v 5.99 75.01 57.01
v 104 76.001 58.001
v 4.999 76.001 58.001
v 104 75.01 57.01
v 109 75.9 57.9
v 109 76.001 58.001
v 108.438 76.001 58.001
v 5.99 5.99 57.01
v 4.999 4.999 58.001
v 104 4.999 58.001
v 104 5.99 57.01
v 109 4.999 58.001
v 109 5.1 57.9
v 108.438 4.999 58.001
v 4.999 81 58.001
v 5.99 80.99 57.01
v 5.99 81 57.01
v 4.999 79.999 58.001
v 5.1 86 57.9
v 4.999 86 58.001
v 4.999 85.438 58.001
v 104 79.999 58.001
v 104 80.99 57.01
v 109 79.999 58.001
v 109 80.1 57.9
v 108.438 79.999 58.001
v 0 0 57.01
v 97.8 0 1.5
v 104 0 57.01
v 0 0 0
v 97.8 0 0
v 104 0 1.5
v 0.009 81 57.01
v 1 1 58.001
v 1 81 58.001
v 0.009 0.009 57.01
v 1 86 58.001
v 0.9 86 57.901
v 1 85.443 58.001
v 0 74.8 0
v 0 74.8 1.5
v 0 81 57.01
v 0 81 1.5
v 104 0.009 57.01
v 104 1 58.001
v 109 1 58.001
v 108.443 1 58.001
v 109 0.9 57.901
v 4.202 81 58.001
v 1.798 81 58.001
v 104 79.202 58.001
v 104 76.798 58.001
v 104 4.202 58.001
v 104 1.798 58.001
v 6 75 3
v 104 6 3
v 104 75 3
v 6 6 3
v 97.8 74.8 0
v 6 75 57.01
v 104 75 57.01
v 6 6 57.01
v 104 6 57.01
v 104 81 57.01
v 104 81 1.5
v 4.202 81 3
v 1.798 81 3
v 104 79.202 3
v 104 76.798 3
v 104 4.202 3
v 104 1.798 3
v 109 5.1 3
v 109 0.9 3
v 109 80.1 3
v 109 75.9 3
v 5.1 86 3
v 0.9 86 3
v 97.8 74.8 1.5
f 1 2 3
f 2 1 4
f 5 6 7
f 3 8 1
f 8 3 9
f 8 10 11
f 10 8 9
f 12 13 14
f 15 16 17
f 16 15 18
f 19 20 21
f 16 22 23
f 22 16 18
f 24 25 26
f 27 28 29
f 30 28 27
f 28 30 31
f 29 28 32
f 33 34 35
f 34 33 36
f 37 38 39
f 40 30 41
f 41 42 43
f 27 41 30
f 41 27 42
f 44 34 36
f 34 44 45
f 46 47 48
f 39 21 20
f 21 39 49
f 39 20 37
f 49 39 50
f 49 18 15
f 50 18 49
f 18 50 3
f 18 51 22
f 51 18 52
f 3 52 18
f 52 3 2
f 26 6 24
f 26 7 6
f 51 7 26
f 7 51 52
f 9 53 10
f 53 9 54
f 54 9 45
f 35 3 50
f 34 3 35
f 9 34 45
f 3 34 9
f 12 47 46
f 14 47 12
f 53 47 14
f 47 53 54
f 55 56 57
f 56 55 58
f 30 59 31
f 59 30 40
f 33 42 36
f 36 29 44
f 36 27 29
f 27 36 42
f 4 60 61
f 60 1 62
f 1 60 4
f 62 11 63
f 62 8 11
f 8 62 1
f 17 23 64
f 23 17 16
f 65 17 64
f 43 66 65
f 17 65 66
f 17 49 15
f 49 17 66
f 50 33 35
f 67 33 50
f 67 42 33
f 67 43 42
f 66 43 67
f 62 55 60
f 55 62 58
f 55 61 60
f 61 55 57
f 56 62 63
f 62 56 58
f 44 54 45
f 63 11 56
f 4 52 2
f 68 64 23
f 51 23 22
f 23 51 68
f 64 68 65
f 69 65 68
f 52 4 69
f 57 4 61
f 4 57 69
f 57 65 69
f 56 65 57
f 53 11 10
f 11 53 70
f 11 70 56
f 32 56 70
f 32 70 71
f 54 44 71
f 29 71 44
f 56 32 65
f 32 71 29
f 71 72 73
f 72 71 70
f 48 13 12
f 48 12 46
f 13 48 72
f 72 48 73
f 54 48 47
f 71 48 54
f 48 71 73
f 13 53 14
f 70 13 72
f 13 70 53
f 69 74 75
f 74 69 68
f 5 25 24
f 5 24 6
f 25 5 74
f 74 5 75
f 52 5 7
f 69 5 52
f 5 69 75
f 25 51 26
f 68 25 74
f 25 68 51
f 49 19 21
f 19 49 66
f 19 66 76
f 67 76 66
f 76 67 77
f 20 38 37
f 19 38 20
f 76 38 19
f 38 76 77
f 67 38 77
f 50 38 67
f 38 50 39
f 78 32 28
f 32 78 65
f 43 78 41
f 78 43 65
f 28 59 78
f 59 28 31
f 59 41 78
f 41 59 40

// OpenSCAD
// ============================================================================
// cutlery_box.scad
// Graduated 3-chamber disposable-cutlery box (Option 3) — CUT-FROM-SOLID port
// of build_box.py, for a 120 x 120 x 120 mm printer (AOSEED).
//
// WHY THIS PORT EXISTS (the whole point):
//   The hand-mesh generator (build_box.py) could not keep the 1 mm rim chamfer
//   continuous across the female dovetail joints, because where a slot's flared
//   corner crosses the sloped chamfer it needs a true boolean intersection.
//   OpenSCAD HAS that boolean kernel, so here we do exactly the "cut-from-solid"
//   thing:
//      1. Build the ENTIRE box as ONE solid, WITH the chamfer already on it.
//      2. difference() out vertical dovetail prisms ( /_\ cross-section ),
//         running from just above the base plate up THROUGH the rim, to both
//         (a) form the sliding-dovetail joints, and
//         (b) split the box into 6 bed-sized pieces.
//   Because the cut is a real boolean through the already-chamfered solid, the
//   sloped chamfer<->slot edge is produced for free => the rim chamfer stays
//   CONTINUOUS across every joint, with none of the sliver hacks.
//
// ----------------------------------------------------------------------------
// HOW TO USE
//   In the app:  set `part` below (or use the Customizer dropdown), F5 to
//                preview, F6 to render, then File > Export > STL.
//   One piece (CLI):
//      openscad -o body_knife_A.stl -D 'part="knife_A"' cutlery_box.scad
//   ALL SIX (bash, run from this folder):
//      for p in knife_A knife_B fork_A fork_B spoon_A spoon_B; do \
//        openscad -o "body_$p.stl" -D "part=\"$p\"" cutlery_box.scad ; done
//   PNG preview of one piece:
//      openscad -o knife_B.png --imgsize=1400,1000 --autocenter --viewall \
//        -D 'part="knife_B"' cutlery_box.scad
//
//   Pieces are modelled in ASSEMBLED coordinates (floor-down, z=0 is the bed),
//   so importing all six STLs together shows the assembled box directly; your
//   slicer will auto-drop each one onto the plate for printing.
//
// BED SANITY: every piece is <= 120 mm in X, Y, Z.
//   Z = 58 mm. Widest piece = spoon at 117 mm (Y). A-halves reach 109 mm (X,
//   including the protruding dovetail key). All under 120.
//
// !! I could NOT run OpenSCAD to verify this file (no binary in my sandbox) !!
//   - The rim chamfer is a SMOOTH, true-45 bevel built from hull() frustums of
//     convex rectangles. Works in every OpenSCAD since ~2015 (incl. Homebrew
//     2021.01). No stepped staircase -- and, crucially, it makes box() a clean
//     well-formed solid so the per-part booleans resolve reliably (the old
//     14-slice staircase was fragile and CGAL was dropping the walls of the
//     interior parts, leaving only the key prisms => "floating boxes").
//   - roof() is still available behind USE_ROOF=true for those who have it
//     (2021.01+ snapshots); for THIS rectangular design it is identical, so it
//     is NOT required.
//   - After F6, check the console for "WARNING"/"not a valid 2-manifold".
//     If a tenon ever looks detached, bump EPS to 0.05.
// ============================================================================


/* [Part to render / export] */
part = "knife_A"; // [knife_A, knife_B, fork_A, fork_B, spoon_A, spoon_B, assembly]

/* [Chamfer method] */
// false = smooth hull() frustum bevel (default, any OpenSCAD); true = roof() (2021.01+)
USE_ROOF = false;

/* [Heights (mm)] */
BASE   = 3.0;     // floor / base-plate thickness
COMP_H = 55.0;    // interior wall height above the floor (cutlery stack depth)

/* [Walls (mm)] */
HOST_T   = 6.0;     // thickness of every wall (thick enough to host a dovetail)
HALF_LEN = 104.0;   // printed length of each half (A = near, B = far); <120 incl. key

/* [Chamber bays (mm)] */
N_COL     = 3;       // columns of cutlery per chamber
KNIFE_COL = 23.0;    // -> knife bay 69  (3 x 19 mm knives + play)
FORK_COL  = 33.0;    // -> fork  bay 99  (3 x 29 mm forks  + play)
SPOON_COL = 37.0;    // -> spoon bay 111 (3 x 34 mm spoons + play, trimmed <120)

/* [Dovetail joint (mm)] */
DT_DEPTH = 5.0;   // tail protrusion past the seam (male key depth)
DT_NECK  = 1.2;   // half-width at the seam face (narrow)
DT_FLARE = 2.1;   // half-width at the tip (wide -> locks)
DT_CLR   = 0.4;   // FLANK/seam slide clearance added to the female socket (do not change for fit)
DT_DEPTH_RELIEF = 0.3; // extra depth on the socket BACK only, so the tail tip never bottoms out

/* [Rim chamfer (mm)] */
CHAMFER = 1.0;    // 45-deg comfort break broken along the top wall edges

/* [Base half-lap / anti-warp (mm)] */
// Neighbouring base plates overlap as a HORIZONTAL half-lap (shiplap) at mid-base
// height, so corners stay coplanar (no lift/protrusion). Horizontal lap faces do
// NOT bind the vertical-drop assembly. Shingle direction: A->B and knife->fork->spoon.
LAP_LEN = 6;        // overlap past the A/B seam and the knife/fork seam
LAP_LEN_FS = 2;     // overlap past the fork/SPOON seam -- SMALLER: spoon is the
                    // tightest piece (117mm of the 120mm bed); a 6mm lap there
                    // would push spoon to 123mm. 2mm keeps spoon at 119mm.
LAP_Z   = BASE/2;   // 1.5 -- horizontal split height of the lap (bottom vs top half)
LAP_CLR = 0.2;      // in-plane clearance so the shelf isn't a press fit


/* [Hidden] */
EPS      = 0.01;          // tiny overlap so abutting solids fuse cleanly in CGAL
// Upper-chamber pieces (fork, spoon) were cut by a cell plane laid EXACTLY on the
// divider wall's far face (the lower chamber owns that wall). intersection() along a
// plane coincident with an existing box face makes CGAL leave a ZERO-THICKNESS copy
// of the wall face -> edge-manifold + "watertight" but degenerate (OpenSCAD shows it
// as a blue back-face; Tinkercad thickens it into a phantom block). SEAM_EPS nudges
// those cut planes a hair INTO the open bay so they no longer coincide with any box
// face -> no flap. 0.02 mm is physically nothing but is well clear of CGAL's tolerance.
SEAM_EPS = 0.02;
CUT_OVER = 1.0;           // how far dovetail cutters overshoot the rim (clean cut)

BODY_H    = BASE + COMP_H;     // 58  total height
END_WALL  = HOST_T;            // end walls are dovetail hosts too -> equally thick
TOTAL_LEN = 2 * HALF_LEN;      // 208 assembled length (end wall .. end wall)

// bay widths
KNIFE_BAY = N_COL * KNIFE_COL; // 69
FORK_BAY  = N_COL * FORK_COL;  // 99
SPOON_BAY = N_COL * SPOON_COL; // 111

// ---- Y layout (width direction): wall | bay | divider | bay | divider | bay | wall
KNIFE_Y0 = 0;
KNIFE_Y1 = HOST_T + KNIFE_BAY + HOST_T;        // 0..81   (outer wall + bay + divider)
FORK_Y0  = KNIFE_Y1;                           // 81
FORK_Y1  = FORK_Y0 + FORK_BAY + HOST_T;        // 81..186 (bay + divider)
SPOON_Y0 = FORK_Y1;                            // 186
SPOON_Y1 = SPOON_Y0 + SPOON_BAY + HOST_T;      // 186..303(bay + outer wall)
EXT_W    = SPOON_Y1;                           // 303 total width

// lengthwise wall Y-bands [y0,y1] (host the A/B dovetails) + their centers
OUTER_L  = [0, HOST_T];                                       // [0,6]    c=3
DIV_KF   = [HOST_T + KNIFE_BAY, HOST_T + KNIFE_BAY + HOST_T]; // [75,81]  c=78
DIV_FS   = [FORK_Y0 + FORK_BAY, FORK_Y0 + FORK_BAY + HOST_T]; // [180,186]c=183
OUTER_R  = [SPOON_Y1 - HOST_T, SPOON_Y1];                     // [297,303]c=300

// the three OPEN bays are rectangular holes in the wall footprint:
//   footprint = outer rectangle MINUS these bays  (== the 6 walls; verified).
// The smooth chamfer is built from exactly this decomposition.
BAY_X0 = END_WALL;              // 6
BAY_X1 = TOTAL_LEN - END_WALL;  // 202
BAYS = [
    [BAY_X0, BAY_X1, HOST_T,   HOST_T + KNIFE_BAY],   // knife bay [6,202] x [6,75]
    [BAY_X0, BAY_X1, FORK_Y0,  FORK_Y0 + FORK_BAY],   // fork  bay [6,202] x [81,180]
    [BAY_X0, BAY_X1, SPOON_Y0, SPOON_Y0 + SPOON_BAY], // spoon bay [6,202] x [186,297]
];

YC_OUTL  = OUTER_L[0] + HOST_T/2;   // 3   outer-left wall center
YC_DIVKF = DIV_KF[0]  + HOST_T/2;   // 78  knife/fork divider center
YC_DIVFS = DIV_FS[0]  + HOST_T/2;   // 183 fork/spoon divider center
YC_OUTR  = OUTER_R[0] + HOST_T/2;   // 300 outer-right wall center

// seams
AB_SEAM = HALF_LEN;               // 104  A/B length seam (x)
SEAM_KF = FORK_Y0;                // 81   knife/fork width seam (y)
SEAM_FS = SPOON_Y0;              // 186  fork/spoon width seam (y)
ENDC_A  = END_WALL/2;             // 3    A end-wall center (x) -> chamber dovetails
ENDC_B  = TOTAL_LEN - END_WALL/2; // 205  B end-wall center (x)


// ============================================================================
// 2D wall footprint (cross-section of all walls, constant in z for the straight
// part). Union of: 2 full-width end walls + 4 lengthwise walls between them.
// ============================================================================
module wall_footprint_2d() {
    // footprint = outer rectangle minus the 3 open bays  (== the 6 walls)
    difference() {
        square([TOTAL_LEN, EXT_W]);
        for (b = BAYS) translate([b[0], b[2]]) square([b[1] - b[0], b[3] - b[2]]);
    }
}

// ============================================================================
// The full chamfered box solid = base plate + walls with a continuous 1 mm
// top-rim chamfer. Built ONCE; every piece is carved out of this.
// ============================================================================
module chamfer_cap() {
    // SMOOTH 45 rim chamfer over z[BODY_H-CHAMFER, BODY_H], in absolute coords.
    zm = BODY_H - CHAMFER;
    if (USE_ROOF) {
        // exact straight-skeleton roof, capped at CHAMFER height (needs roof()).
        intersection() {
            translate([0,0,zm]) roof() wall_footprint_2d();
            translate([0,0,zm]) linear_extrude(CHAMFER + EPS) wall_footprint_2d();
        }
    } else {
        // DEFAULT: true 45 bevel as hull() frustums of CONVEX rectangles -> smooth
        // AND a clean manifold.  Since footprint = outer - bays, the chamfer of the
        // footprint = (outer rectangle beveled inward) MINUS (each bay beveled so it
        // grows toward the top, which bevels every bay-facing rim).  All hull()s are
        // on convex rectangles, so nothing gets convex-filled.
        difference() {
            // outer perimeter frustum: full outer rect at zm -> inset by CHAMFER at top
            hull() {
                translate([0,0,zm])     linear_extrude(0.001) square([TOTAL_LEN, EXT_W]);
                translate([0,0,BODY_H]) linear_extrude(0.001) offset(delta=-CHAMFER) square([TOTAL_LEN, EXT_W]);
            }
            // each bay grows by CHAMFER toward the top -> bevels its surrounding rim.
            // (overshoots z a hair past both ends so the cut is clean.)
            for (b = BAYS)
                hull() {
                    translate([0,0,zm-EPS])     linear_extrude(0.001)
                        translate([b[0],b[2]]) offset(delta=-EPS)        square([b[1]-b[0], b[3]-b[2]]);
                    translate([0,0,BODY_H+EPS]) linear_extrude(0.001)
                        translate([b[0],b[2]]) offset(delta=CHAMFER+EPS) square([b[1]-b[0], b[3]-b[2]]);
                }
        }
    }
}

module box() {
    zm = BODY_H - CHAMFER;
    union() {
        cube([TOTAL_LEN, EXT_W, BASE]);                                        // base plate z[0,3]
        translate([0,0,BASE]) linear_extrude(zm - BASE + EPS) wall_footprint_2d(); // straight walls z[3,57]
        chamfer_cap();                                                         // smooth chamfer z[57,58]
    }
}

// ============================================================================
// Dovetail prisms ( /_\ ). Vertical, z[BASE, BODY_H+CUT_OVER] so they cut
// through the rim but leave the base plate continuous. The near face is pushed
// back EPS so a male key always fuses to its wall.
//   male key   : half_n=DT_NECK,         half_f=DT_FLARE
//   female slot: half_n=DT_NECK+DT_CLR,  half_f=DT_FLARE+DT_CLR
// ============================================================================
module dt_prism_X(seam_x, yc, half_n, half_f) {   // perpendicular to X, grows +X
    translate([0,0,BASE]) linear_extrude(BODY_H - BASE + CUT_OVER)
        polygon([[seam_x - EPS,        yc - half_n],
                 [seam_x + DT_DEPTH,   yc - half_f],
                 [seam_x + DT_DEPTH,   yc + half_f],
                 [seam_x - EPS,        yc + half_n]]);
}
module dt_prism_Y(seam_y, xc, half_n, half_f) {   // perpendicular to Y, grows +Y
    translate([0,0,BASE]) linear_extrude(BODY_H - BASE + CUT_OVER)
        polygon([[xc - half_n, seam_y - EPS],
                 [xc - half_f, seam_y + DT_DEPTH],
                 [xc + half_f, seam_y + DT_DEPTH],
                 [xc + half_n, seam_y - EPS]]);
}
module ab_key   (yc)        { dt_prism_X(AB_SEAM, yc, DT_NECK, DT_FLARE); }
module ch_key   (seam_y, xc){ dt_prism_Y(seam_y, xc, DT_NECK, DT_FLARE); }

// Female sockets = male + DT_CLR on the flanks/seam (unchanged), PLUS a straight
// back-face relief of DT_DEPTH_RELIEF so the tail tip never bottoms out. The
// relief is a rectangle tacked onto the trapezoid's tip at the SAME flare width,
// so the angled flank faces (and their 0.4 mm slide clearance) are untouched.
module ab_socket(yc) {
    dt_prism_X(AB_SEAM, yc, DT_NECK + DT_CLR, DT_FLARE + DT_CLR);
    translate([0,0,BASE]) linear_extrude(BODY_H - BASE + CUT_OVER)
        translate([AB_SEAM + DT_DEPTH, yc - (DT_FLARE + DT_CLR)])
            square([DT_DEPTH_RELIEF, 2*(DT_FLARE + DT_CLR)]);          // back relief, +X
}
module ch_socket(seam_y, xc) {
    dt_prism_Y(seam_y, xc, DT_NECK + DT_CLR, DT_FLARE + DT_CLR);
    translate([0,0,BASE]) linear_extrude(BODY_H - BASE + CUT_OVER)
        translate([xc - (DT_FLARE + DT_CLR), seam_y + DT_DEPTH])
            square([2*(DT_FLARE + DT_CLR), DT_DEPTH_RELIEF]);          // back relief, +Y
}

// rectangular cell (x[xa,xb], y[ya,yb], full height + margin) used to split pieces
module cell(xa, xb, ya, yb) {
    translate([xa, ya, -1]) cube([xb - xa, yb - ya, BODY_H + 11]);
}

// ===== base half-lap (shiplap) =================================================
// HORIZONTAL lap at mid-base height: the shelf-owner keeps its BOTTOM half
// (z 0..LAP_Z) extending LAP_LEN past the seam; the neighbour has its bottom half
// REMOVED there (keeps only the top half) and lands flat on the shelf. Horizontal
// faces => no binding during the vertical drop. Shelves live entirely in the base
// (z < BASE), well clear of the wall dovetails (z >= BASE).
// Shingle = FEMALE-first (matches the no-notch dovetail assembly order, which
// lowers the male piece onto the female): the B half owns the A/B shelf (grows
// -X into A) and the UPPER chamber (fork, spoon) owns the chamber shelf (grows
// -Y into the lower chamber).  Order: spoon, fork, knife; B before A.
module lap_shelf_X(y0, y1) {                 // B-side shelf, grows -X into A past AB_SEAM
    // +EPS past AB_SEAM so the shelf interpenetrates (not just abuts) its own B body -> fuses cleanly.
    translate([AB_SEAM - LAP_LEN, y0, 0]) cube([LAP_LEN + EPS, y1 - y0, LAP_Z]);
}
module lap_neg_X(y0, y1) {                   // A-side: remove bottom half to receive it
    translate([AB_SEAM - LAP_LEN - LAP_CLR, y0 - EPS, -EPS])
        cube([LAP_LEN + LAP_CLR + EPS, (y1 - y0) + 2*EPS, LAP_Z + EPS]);
}
module lap_shelf_Y(seam_y, x0, x1, ln=LAP_LEN) {   // upper-chamber shelf, grows -Y into lower
    // grows -Y by `ln` into the lower chamber AND +Y by 2*SEAM_EPS past the seam so it
    // always overlaps the (SEAM_EPS-nudged) body floor and stays fused -> no floating shelf.
    translate([x0, seam_y - ln, 0]) cube([x1 - x0, ln + 2*SEAM_EPS, LAP_Z]);
}
module lap_neg_Y(seam_y, x0, x1, ln=LAP_LEN) {     // lower-chamber: remove bottom half
    translate([x0 - EPS, seam_y - ln - LAP_CLR, -EPS])
        cube([(x1 - x0) + 2*EPS, ln + LAP_CLR + EPS, LAP_Z + EPS]);
}

// ============================================================================
// The six pieces.  piece = intersection(box, cell + own male keys) - own sockets
//   A halves are MALE on the A/B seam (keep the key); B halves are FEMALE (slot).
//   On a chamber seam the LEFT chamber is male (+Y), the right chamber is female.
// ============================================================================
// Base half-lap shingling (FEMALE-first, Option 1):
//   A/B seam  -> the B half owns the bottom shelf (grows -X), A has the negative.
//   chamber   -> the UPPER chamber (fork, spoon) owns the shelf (grows -Y); the
//                lower chamber (knife, fork) has the negative.
//   Assembly order: spoon, fork, knife; B before A (male lowered onto female).
// Center crossings (104,81)&(104,186): the CHAMBER shelf (fork_A / spoon_A) owns the
//   crossing square; the B-half A/B shelf (knife_B / fork_B) is CLIPPED short of the
//   chamber seam by LAP_LEN so two shelves never collide.
module knife_A() {                                       // placed LAST; receives everything
    difference() {
        intersection() {
            box();
            union() {
                cell(-1, AB_SEAM, KNIFE_Y0 - 1, KNIFE_Y1);
                ab_key(YC_OUTL); ab_key(YC_DIVKF); ch_key(SEAM_KF, ENDC_A);
            }
        }
        lap_neg_X(KNIFE_Y0, KNIFE_Y1);            // receive knife_B's A/B shelf
        lap_neg_Y(SEAM_KF, 0, AB_SEAM);           // receive fork_A's chamber shelf
    }
}

module knife_B() {
    difference() {
        union() {
            intersection() {
                box();
                union() {
                    cell(AB_SEAM, TOTAL_LEN + 1, KNIFE_Y0 - 1, KNIFE_Y1);
                    ch_key(SEAM_KF, ENDC_B);
                }
            }
            lap_shelf_X(KNIFE_Y0, KNIFE_Y1 - LAP_LEN);  // A/B shelf -> knife_A (CLIPPED at y=81 crossing)
        }
        ab_socket(YC_OUTL); ab_socket(YC_DIVKF);
        lap_neg_Y(SEAM_KF, AB_SEAM, TOTAL_LEN);         // receive fork_B's chamber shelf
    }
}

module fork_A() {
    difference() {
        union() {
            intersection() {
                box();
                union() {
                    cell(-1, AB_SEAM, FORK_Y0 + SEAM_EPS, FORK_Y1);  // -Y cut nudged off the divider face
                    ab_key(YC_DIVFS); ch_key(SEAM_FS, ENDC_A);
                }
            }
            lap_shelf_Y(SEAM_KF, 0, AB_SEAM);           // chamber shelf -> knife_A (owns crossing)
        }
        lap_neg_X(FORK_Y0, FORK_Y1);                    // receive fork_B's A/B shelf
        ch_socket(SEAM_KF, ENDC_A);
        lap_neg_Y(SEAM_FS, 0, AB_SEAM, LAP_LEN_FS);     // receive spoon_A's (small) chamber shelf
    }
}

module fork_B() {
    difference() {
        union() {
            intersection() {
                box();
                union() {
                    cell(AB_SEAM, TOTAL_LEN + 1, FORK_Y0 + SEAM_EPS, FORK_Y1);  // -Y cut nudged off the divider face
                    ch_key(SEAM_FS, ENDC_B);
                }
            }
            lap_shelf_X(FORK_Y0, FORK_Y1 - LAP_LEN_FS); // A/B shelf -> fork_A (CLIPPED at y=186 crossing)
            lap_shelf_Y(SEAM_KF, AB_SEAM, TOTAL_LEN);   // chamber shelf -> knife_B
        }
        ab_socket(YC_DIVFS);
        ch_socket(SEAM_KF, ENDC_B);
        lap_neg_Y(SEAM_FS, AB_SEAM, TOTAL_LEN, LAP_LEN_FS); // receive spoon_B's (small) chamber shelf
    }
}

module spoon_A() {
    difference() {
        union() {
            intersection() {
                box();
                union() {
                    cell(-1, AB_SEAM, SPOON_Y0 + SEAM_EPS, SPOON_Y1 + 1);  // -Y cut nudged off the divider face
                    ab_key(YC_OUTR);
                }
            }
            lap_shelf_Y(SEAM_FS, 0, AB_SEAM, LAP_LEN_FS); // chamber shelf -> fork_A (small; owns crossing)
        }
        lap_neg_X(SPOON_Y0, SPOON_Y1);                  // receive spoon_B's A/B shelf
        ch_socket(SEAM_FS, ENDC_A);
    }
}

module spoon_B() {                                      // placed FIRST; owns shelves
    difference() {
        union() {
            intersection() {
                box();
                union() {
                    cell(AB_SEAM, TOTAL_LEN + 1, SPOON_Y0 + SEAM_EPS, SPOON_Y1 + 1);  // -Y cut nudged off the divider face
                }
            }
            lap_shelf_X(SPOON_Y0, SPOON_Y1);            // A/B shelf -> spoon_A
            lap_shelf_Y(SEAM_FS, AB_SEAM, TOTAL_LEN, LAP_LEN_FS); // chamber shelf -> fork_B (small)
        }
        ab_socket(YC_OUTR);
        ch_socket(SEAM_FS, ENDC_B);
    }
}

// Fast preview: the full continuous-chamfer box (no cuts). The six part modules
// above are the real, separable pieces. To instead see the TRUE assembled
// pieces with their joints (slower — 6 booleans), replace box(); below with:
//   knife_A(); knife_B(); fork_A(); fork_B(); spoon_A(); spoon_B();
module assembly() {
    box();
}

// ============================================================================
// Render dispatch
// ============================================================================
if      (part == "knife_A")  knife_A();
else if (part == "knife_B")  knife_B();
else if (part == "fork_A")   fork_A();
else if (part == "fork_B")   fork_B();
else if (part == "spoon_A")  spoon_A();
else if (part == "spoon_B")  spoon_B();
else if (part == "assembly") assembly();
else echo(str("Unknown part: ", part));
